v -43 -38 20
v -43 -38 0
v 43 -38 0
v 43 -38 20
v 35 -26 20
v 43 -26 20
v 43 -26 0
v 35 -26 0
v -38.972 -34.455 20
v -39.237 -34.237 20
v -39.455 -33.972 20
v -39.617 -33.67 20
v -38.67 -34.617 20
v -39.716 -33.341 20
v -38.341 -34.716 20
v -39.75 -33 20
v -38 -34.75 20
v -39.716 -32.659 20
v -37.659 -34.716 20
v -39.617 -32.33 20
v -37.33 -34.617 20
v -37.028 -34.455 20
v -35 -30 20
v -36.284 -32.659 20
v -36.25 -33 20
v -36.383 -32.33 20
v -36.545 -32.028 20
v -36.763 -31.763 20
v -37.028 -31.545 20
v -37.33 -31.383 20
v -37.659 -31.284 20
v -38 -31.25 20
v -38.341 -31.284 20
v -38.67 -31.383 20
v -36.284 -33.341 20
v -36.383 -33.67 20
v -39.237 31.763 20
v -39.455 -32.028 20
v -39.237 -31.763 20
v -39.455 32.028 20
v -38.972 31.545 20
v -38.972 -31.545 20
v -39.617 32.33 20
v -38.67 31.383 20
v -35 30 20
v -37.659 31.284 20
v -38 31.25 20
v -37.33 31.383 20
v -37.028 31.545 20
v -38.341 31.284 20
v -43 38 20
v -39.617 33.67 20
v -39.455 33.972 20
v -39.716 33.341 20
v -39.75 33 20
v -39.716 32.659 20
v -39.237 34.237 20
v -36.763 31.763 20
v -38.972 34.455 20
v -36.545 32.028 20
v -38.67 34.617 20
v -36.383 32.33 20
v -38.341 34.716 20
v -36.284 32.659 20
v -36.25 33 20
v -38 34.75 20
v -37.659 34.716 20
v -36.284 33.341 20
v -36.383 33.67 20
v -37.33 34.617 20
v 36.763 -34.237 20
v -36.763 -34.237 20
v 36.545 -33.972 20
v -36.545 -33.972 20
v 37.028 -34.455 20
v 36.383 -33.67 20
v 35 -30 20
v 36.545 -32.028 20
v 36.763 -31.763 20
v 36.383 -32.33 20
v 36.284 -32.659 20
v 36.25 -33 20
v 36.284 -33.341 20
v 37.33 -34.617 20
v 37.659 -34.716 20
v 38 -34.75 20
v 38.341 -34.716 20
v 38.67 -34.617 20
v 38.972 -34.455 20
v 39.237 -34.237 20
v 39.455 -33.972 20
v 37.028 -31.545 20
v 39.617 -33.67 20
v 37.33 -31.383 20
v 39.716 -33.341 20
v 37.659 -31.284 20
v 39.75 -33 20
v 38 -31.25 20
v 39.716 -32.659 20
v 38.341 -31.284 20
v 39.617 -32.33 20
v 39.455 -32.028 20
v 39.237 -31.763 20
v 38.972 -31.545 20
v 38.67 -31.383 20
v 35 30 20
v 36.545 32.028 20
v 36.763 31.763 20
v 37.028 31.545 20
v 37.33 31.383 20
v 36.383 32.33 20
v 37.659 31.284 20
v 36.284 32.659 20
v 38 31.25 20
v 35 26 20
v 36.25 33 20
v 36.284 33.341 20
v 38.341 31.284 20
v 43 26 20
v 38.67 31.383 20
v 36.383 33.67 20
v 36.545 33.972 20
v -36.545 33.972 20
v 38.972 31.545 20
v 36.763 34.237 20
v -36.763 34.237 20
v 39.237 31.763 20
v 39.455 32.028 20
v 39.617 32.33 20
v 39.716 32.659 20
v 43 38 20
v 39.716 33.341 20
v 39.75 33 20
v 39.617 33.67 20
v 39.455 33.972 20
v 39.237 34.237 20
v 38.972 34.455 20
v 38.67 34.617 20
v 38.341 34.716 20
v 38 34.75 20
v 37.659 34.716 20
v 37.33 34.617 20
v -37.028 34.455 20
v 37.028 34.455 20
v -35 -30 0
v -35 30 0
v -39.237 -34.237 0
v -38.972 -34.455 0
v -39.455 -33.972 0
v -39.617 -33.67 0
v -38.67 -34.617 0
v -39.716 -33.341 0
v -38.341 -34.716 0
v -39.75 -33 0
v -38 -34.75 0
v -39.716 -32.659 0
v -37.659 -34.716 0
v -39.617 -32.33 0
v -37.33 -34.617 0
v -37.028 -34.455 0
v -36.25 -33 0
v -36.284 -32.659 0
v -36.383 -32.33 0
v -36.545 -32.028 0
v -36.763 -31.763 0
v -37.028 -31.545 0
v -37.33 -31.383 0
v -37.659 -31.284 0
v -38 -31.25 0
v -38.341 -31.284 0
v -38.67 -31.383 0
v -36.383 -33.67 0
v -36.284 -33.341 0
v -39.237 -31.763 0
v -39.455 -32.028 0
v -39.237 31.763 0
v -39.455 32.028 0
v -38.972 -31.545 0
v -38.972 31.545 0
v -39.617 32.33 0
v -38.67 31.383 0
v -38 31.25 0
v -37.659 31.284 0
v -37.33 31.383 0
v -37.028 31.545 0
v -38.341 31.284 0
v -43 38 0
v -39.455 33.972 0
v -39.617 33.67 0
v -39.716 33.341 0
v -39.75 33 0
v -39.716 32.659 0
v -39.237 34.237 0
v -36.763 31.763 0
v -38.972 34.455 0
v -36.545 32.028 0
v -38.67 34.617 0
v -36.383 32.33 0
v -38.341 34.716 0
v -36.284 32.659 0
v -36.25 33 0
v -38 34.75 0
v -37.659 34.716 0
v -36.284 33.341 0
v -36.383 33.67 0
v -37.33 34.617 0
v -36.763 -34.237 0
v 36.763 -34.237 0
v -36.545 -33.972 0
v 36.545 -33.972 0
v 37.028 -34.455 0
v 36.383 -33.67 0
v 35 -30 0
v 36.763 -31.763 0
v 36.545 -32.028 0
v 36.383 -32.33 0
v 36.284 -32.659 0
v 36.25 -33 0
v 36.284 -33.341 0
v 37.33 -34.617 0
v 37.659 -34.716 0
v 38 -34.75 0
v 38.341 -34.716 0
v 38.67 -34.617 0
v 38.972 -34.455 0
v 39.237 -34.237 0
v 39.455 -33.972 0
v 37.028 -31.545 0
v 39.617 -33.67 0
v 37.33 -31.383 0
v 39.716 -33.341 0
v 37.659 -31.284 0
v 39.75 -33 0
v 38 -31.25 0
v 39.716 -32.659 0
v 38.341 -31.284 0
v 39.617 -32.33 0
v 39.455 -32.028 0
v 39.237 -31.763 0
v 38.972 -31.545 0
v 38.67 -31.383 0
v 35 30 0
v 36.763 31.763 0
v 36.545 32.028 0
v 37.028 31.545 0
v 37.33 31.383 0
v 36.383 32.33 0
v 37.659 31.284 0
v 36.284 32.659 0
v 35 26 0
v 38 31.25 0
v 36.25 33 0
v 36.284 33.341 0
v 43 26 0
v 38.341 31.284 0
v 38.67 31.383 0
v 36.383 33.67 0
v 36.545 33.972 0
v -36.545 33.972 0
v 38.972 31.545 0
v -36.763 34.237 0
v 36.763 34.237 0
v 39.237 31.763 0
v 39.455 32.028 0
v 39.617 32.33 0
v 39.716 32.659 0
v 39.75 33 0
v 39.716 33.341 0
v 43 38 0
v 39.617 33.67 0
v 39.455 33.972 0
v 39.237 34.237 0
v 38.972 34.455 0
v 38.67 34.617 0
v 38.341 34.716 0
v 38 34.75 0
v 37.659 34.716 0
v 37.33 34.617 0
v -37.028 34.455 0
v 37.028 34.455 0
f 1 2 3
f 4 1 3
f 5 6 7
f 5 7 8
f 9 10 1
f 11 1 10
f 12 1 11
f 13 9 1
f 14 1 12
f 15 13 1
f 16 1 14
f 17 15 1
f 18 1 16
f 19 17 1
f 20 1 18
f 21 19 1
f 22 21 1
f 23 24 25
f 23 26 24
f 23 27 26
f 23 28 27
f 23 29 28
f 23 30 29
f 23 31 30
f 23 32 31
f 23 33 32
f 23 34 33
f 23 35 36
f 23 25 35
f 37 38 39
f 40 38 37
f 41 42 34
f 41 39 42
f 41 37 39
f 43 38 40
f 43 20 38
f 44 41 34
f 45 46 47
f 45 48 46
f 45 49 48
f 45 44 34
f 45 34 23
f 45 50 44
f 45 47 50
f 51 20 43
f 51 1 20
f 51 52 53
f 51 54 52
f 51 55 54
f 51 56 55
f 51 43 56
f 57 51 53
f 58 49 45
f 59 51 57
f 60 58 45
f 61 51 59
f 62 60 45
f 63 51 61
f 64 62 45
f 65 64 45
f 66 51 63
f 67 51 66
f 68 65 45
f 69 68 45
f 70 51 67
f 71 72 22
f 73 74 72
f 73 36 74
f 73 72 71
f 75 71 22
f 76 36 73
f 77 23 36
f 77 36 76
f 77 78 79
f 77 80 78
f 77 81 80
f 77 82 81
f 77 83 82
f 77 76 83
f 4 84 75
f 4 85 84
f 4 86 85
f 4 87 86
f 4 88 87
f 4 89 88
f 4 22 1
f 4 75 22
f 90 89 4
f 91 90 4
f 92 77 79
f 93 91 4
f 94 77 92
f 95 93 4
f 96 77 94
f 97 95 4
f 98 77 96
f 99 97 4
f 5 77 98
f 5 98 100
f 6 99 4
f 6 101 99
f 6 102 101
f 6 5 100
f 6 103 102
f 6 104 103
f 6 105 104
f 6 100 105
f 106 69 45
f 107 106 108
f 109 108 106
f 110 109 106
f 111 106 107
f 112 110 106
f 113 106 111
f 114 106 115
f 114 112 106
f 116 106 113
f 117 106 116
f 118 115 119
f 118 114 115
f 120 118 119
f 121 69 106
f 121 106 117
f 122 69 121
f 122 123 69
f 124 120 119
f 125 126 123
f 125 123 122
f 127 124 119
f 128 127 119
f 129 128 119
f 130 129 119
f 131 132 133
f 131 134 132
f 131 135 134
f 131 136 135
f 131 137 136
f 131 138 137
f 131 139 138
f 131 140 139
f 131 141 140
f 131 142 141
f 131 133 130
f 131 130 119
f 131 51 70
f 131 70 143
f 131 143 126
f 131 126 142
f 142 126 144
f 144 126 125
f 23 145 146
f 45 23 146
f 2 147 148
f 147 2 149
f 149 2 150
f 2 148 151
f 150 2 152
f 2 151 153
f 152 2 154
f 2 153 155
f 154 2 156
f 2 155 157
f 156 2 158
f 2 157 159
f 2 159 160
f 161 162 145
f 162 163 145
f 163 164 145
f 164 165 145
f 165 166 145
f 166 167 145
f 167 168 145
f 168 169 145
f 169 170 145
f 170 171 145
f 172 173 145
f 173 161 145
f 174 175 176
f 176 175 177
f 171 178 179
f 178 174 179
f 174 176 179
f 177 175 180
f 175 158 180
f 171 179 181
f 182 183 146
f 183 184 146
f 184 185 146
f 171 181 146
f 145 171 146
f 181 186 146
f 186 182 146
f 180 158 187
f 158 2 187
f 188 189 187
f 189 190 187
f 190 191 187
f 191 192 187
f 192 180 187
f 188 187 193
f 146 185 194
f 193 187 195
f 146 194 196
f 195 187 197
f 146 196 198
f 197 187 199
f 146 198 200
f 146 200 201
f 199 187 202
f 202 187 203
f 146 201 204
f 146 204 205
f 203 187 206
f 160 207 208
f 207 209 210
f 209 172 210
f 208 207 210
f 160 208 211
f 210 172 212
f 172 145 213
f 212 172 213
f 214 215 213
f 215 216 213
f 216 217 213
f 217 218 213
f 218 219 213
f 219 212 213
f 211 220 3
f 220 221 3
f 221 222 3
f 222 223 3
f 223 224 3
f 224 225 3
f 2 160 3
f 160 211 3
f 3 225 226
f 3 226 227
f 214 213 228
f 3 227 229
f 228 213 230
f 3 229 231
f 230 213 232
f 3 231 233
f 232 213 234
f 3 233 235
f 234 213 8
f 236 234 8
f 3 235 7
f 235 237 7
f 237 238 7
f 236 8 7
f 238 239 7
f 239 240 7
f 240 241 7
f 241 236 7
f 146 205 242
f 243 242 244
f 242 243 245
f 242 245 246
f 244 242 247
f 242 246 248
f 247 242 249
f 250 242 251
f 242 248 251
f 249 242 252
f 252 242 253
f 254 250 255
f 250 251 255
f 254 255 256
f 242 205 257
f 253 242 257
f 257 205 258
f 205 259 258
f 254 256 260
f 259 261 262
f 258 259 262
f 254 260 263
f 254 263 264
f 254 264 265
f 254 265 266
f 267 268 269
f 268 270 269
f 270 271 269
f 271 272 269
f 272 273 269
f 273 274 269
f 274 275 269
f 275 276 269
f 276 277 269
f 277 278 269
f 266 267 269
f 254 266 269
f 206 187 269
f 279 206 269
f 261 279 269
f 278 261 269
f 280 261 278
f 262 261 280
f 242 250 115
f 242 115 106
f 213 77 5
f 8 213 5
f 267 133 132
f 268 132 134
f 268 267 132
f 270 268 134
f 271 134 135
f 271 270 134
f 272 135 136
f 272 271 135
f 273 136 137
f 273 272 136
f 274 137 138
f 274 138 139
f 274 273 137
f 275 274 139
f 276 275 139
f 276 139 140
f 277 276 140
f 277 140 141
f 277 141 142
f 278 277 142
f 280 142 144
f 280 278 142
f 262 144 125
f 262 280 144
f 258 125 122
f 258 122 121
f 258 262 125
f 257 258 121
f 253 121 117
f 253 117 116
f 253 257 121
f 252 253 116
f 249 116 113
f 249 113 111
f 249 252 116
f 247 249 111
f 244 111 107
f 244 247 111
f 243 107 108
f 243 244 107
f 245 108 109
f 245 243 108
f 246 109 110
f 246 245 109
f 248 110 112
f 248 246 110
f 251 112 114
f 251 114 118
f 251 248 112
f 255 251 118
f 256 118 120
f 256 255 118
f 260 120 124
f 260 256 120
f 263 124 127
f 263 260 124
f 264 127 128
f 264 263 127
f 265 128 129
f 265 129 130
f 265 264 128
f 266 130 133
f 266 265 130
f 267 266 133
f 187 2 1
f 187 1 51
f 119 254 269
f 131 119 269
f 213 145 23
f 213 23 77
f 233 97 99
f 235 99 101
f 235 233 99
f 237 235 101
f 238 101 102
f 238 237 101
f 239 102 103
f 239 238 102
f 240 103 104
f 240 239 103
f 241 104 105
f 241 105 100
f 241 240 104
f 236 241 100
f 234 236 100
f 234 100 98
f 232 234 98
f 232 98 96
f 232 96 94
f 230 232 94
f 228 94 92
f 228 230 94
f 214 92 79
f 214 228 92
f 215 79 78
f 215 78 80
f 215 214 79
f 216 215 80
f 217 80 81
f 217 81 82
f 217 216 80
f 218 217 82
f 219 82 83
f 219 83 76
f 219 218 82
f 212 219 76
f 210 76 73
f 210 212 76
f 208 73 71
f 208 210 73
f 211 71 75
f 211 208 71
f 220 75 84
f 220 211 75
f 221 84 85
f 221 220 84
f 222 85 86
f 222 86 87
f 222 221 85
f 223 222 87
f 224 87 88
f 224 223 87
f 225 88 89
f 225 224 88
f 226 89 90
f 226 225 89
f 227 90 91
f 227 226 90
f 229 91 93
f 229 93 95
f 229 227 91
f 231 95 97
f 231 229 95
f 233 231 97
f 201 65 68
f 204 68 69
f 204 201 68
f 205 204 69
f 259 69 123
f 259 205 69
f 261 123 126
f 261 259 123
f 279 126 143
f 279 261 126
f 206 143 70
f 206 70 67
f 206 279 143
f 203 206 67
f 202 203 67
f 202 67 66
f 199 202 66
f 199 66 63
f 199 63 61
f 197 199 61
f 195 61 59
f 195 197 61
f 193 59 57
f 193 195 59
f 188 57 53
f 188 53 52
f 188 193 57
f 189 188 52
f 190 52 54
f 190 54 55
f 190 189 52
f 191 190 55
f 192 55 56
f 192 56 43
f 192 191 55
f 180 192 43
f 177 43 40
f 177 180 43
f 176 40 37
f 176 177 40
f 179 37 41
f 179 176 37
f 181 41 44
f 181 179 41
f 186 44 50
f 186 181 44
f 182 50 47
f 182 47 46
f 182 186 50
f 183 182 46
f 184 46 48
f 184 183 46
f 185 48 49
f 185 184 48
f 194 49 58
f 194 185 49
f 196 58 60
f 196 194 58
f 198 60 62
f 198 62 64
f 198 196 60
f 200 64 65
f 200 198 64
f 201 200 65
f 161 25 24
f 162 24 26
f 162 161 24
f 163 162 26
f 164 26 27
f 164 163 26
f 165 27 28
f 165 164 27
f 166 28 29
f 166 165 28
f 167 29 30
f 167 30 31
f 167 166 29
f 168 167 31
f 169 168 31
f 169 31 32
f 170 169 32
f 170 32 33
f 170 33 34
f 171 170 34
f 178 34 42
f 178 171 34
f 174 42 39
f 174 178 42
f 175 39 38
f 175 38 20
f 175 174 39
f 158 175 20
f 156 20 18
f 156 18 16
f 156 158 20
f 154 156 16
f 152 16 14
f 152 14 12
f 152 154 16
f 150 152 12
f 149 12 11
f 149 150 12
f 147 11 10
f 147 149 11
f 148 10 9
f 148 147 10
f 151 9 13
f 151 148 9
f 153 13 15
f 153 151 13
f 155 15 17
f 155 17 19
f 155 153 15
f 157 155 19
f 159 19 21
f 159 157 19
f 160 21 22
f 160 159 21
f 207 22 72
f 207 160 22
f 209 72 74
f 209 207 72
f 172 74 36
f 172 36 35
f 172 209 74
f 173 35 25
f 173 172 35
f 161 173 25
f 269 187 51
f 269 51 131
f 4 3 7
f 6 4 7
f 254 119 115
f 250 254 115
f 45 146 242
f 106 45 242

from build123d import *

# Parameters (mm, degrees)
SKETCH_1_W          = 86
SKETCH_1_H          = 76
SKETCH_1_R          = 1.75
SKETCH_1_W_2        = 70
SKETCH_1_H_2        = 60
EXTRUDE_1_DEPTH     = 20
CUT_EXTRUDE_1_REACH = 62.77
SKETCH_2_W          = 8
SKETCH_2_H          = 52


with BuildPart() as part:
    # 草图1 → 凸台-拉伸1 (new body)
    with BuildSketch(Plane.XY):
        Rectangle(SKETCH_1_W, SKETCH_1_H)
        with Locations((-38, 33)):
            Circle(SKETCH_1_R, mode=Mode.SUBTRACT)
        with Locations((38, 33)):
            Circle(SKETCH_1_R, mode=Mode.SUBTRACT)
        with Locations((38, -33)):
            Circle(SKETCH_1_R, mode=Mode.SUBTRACT)
        with Locations((-38, -33)):
            Circle(SKETCH_1_R, mode=Mode.SUBTRACT)
        Rectangle(SKETCH_1_W_2, SKETCH_1_H_2, mode=Mode.SUBTRACT)
    extrude(amount=EXTRUDE_1_DEPTH)

    # 草图2 → 切除-拉伸1 (cut, up to next)
    with BuildSketch(Plane(origin=(0, 0, 0), x_dir=(-1, 0, 0), z_dir=(0, 0, -1)), mode=Mode.PRIVATE) as cut_extrude_1_sk1:
        with Locations((-39, 0)):
            Rectangle(SKETCH_2_W, SKETCH_2_H)
    cut_extrude_1_tool1 = extrude(cut_extrude_1_sk1.sketch, amount=-CUT_EXTRUDE_1_REACH, mode=Mode.PRIVATE) & part.part
    add(cut_extrude_1_tool1.solids().sort_by_distance((39, 0, 0))[0], mode=Mode.SUBTRACT)


solid = part.part
